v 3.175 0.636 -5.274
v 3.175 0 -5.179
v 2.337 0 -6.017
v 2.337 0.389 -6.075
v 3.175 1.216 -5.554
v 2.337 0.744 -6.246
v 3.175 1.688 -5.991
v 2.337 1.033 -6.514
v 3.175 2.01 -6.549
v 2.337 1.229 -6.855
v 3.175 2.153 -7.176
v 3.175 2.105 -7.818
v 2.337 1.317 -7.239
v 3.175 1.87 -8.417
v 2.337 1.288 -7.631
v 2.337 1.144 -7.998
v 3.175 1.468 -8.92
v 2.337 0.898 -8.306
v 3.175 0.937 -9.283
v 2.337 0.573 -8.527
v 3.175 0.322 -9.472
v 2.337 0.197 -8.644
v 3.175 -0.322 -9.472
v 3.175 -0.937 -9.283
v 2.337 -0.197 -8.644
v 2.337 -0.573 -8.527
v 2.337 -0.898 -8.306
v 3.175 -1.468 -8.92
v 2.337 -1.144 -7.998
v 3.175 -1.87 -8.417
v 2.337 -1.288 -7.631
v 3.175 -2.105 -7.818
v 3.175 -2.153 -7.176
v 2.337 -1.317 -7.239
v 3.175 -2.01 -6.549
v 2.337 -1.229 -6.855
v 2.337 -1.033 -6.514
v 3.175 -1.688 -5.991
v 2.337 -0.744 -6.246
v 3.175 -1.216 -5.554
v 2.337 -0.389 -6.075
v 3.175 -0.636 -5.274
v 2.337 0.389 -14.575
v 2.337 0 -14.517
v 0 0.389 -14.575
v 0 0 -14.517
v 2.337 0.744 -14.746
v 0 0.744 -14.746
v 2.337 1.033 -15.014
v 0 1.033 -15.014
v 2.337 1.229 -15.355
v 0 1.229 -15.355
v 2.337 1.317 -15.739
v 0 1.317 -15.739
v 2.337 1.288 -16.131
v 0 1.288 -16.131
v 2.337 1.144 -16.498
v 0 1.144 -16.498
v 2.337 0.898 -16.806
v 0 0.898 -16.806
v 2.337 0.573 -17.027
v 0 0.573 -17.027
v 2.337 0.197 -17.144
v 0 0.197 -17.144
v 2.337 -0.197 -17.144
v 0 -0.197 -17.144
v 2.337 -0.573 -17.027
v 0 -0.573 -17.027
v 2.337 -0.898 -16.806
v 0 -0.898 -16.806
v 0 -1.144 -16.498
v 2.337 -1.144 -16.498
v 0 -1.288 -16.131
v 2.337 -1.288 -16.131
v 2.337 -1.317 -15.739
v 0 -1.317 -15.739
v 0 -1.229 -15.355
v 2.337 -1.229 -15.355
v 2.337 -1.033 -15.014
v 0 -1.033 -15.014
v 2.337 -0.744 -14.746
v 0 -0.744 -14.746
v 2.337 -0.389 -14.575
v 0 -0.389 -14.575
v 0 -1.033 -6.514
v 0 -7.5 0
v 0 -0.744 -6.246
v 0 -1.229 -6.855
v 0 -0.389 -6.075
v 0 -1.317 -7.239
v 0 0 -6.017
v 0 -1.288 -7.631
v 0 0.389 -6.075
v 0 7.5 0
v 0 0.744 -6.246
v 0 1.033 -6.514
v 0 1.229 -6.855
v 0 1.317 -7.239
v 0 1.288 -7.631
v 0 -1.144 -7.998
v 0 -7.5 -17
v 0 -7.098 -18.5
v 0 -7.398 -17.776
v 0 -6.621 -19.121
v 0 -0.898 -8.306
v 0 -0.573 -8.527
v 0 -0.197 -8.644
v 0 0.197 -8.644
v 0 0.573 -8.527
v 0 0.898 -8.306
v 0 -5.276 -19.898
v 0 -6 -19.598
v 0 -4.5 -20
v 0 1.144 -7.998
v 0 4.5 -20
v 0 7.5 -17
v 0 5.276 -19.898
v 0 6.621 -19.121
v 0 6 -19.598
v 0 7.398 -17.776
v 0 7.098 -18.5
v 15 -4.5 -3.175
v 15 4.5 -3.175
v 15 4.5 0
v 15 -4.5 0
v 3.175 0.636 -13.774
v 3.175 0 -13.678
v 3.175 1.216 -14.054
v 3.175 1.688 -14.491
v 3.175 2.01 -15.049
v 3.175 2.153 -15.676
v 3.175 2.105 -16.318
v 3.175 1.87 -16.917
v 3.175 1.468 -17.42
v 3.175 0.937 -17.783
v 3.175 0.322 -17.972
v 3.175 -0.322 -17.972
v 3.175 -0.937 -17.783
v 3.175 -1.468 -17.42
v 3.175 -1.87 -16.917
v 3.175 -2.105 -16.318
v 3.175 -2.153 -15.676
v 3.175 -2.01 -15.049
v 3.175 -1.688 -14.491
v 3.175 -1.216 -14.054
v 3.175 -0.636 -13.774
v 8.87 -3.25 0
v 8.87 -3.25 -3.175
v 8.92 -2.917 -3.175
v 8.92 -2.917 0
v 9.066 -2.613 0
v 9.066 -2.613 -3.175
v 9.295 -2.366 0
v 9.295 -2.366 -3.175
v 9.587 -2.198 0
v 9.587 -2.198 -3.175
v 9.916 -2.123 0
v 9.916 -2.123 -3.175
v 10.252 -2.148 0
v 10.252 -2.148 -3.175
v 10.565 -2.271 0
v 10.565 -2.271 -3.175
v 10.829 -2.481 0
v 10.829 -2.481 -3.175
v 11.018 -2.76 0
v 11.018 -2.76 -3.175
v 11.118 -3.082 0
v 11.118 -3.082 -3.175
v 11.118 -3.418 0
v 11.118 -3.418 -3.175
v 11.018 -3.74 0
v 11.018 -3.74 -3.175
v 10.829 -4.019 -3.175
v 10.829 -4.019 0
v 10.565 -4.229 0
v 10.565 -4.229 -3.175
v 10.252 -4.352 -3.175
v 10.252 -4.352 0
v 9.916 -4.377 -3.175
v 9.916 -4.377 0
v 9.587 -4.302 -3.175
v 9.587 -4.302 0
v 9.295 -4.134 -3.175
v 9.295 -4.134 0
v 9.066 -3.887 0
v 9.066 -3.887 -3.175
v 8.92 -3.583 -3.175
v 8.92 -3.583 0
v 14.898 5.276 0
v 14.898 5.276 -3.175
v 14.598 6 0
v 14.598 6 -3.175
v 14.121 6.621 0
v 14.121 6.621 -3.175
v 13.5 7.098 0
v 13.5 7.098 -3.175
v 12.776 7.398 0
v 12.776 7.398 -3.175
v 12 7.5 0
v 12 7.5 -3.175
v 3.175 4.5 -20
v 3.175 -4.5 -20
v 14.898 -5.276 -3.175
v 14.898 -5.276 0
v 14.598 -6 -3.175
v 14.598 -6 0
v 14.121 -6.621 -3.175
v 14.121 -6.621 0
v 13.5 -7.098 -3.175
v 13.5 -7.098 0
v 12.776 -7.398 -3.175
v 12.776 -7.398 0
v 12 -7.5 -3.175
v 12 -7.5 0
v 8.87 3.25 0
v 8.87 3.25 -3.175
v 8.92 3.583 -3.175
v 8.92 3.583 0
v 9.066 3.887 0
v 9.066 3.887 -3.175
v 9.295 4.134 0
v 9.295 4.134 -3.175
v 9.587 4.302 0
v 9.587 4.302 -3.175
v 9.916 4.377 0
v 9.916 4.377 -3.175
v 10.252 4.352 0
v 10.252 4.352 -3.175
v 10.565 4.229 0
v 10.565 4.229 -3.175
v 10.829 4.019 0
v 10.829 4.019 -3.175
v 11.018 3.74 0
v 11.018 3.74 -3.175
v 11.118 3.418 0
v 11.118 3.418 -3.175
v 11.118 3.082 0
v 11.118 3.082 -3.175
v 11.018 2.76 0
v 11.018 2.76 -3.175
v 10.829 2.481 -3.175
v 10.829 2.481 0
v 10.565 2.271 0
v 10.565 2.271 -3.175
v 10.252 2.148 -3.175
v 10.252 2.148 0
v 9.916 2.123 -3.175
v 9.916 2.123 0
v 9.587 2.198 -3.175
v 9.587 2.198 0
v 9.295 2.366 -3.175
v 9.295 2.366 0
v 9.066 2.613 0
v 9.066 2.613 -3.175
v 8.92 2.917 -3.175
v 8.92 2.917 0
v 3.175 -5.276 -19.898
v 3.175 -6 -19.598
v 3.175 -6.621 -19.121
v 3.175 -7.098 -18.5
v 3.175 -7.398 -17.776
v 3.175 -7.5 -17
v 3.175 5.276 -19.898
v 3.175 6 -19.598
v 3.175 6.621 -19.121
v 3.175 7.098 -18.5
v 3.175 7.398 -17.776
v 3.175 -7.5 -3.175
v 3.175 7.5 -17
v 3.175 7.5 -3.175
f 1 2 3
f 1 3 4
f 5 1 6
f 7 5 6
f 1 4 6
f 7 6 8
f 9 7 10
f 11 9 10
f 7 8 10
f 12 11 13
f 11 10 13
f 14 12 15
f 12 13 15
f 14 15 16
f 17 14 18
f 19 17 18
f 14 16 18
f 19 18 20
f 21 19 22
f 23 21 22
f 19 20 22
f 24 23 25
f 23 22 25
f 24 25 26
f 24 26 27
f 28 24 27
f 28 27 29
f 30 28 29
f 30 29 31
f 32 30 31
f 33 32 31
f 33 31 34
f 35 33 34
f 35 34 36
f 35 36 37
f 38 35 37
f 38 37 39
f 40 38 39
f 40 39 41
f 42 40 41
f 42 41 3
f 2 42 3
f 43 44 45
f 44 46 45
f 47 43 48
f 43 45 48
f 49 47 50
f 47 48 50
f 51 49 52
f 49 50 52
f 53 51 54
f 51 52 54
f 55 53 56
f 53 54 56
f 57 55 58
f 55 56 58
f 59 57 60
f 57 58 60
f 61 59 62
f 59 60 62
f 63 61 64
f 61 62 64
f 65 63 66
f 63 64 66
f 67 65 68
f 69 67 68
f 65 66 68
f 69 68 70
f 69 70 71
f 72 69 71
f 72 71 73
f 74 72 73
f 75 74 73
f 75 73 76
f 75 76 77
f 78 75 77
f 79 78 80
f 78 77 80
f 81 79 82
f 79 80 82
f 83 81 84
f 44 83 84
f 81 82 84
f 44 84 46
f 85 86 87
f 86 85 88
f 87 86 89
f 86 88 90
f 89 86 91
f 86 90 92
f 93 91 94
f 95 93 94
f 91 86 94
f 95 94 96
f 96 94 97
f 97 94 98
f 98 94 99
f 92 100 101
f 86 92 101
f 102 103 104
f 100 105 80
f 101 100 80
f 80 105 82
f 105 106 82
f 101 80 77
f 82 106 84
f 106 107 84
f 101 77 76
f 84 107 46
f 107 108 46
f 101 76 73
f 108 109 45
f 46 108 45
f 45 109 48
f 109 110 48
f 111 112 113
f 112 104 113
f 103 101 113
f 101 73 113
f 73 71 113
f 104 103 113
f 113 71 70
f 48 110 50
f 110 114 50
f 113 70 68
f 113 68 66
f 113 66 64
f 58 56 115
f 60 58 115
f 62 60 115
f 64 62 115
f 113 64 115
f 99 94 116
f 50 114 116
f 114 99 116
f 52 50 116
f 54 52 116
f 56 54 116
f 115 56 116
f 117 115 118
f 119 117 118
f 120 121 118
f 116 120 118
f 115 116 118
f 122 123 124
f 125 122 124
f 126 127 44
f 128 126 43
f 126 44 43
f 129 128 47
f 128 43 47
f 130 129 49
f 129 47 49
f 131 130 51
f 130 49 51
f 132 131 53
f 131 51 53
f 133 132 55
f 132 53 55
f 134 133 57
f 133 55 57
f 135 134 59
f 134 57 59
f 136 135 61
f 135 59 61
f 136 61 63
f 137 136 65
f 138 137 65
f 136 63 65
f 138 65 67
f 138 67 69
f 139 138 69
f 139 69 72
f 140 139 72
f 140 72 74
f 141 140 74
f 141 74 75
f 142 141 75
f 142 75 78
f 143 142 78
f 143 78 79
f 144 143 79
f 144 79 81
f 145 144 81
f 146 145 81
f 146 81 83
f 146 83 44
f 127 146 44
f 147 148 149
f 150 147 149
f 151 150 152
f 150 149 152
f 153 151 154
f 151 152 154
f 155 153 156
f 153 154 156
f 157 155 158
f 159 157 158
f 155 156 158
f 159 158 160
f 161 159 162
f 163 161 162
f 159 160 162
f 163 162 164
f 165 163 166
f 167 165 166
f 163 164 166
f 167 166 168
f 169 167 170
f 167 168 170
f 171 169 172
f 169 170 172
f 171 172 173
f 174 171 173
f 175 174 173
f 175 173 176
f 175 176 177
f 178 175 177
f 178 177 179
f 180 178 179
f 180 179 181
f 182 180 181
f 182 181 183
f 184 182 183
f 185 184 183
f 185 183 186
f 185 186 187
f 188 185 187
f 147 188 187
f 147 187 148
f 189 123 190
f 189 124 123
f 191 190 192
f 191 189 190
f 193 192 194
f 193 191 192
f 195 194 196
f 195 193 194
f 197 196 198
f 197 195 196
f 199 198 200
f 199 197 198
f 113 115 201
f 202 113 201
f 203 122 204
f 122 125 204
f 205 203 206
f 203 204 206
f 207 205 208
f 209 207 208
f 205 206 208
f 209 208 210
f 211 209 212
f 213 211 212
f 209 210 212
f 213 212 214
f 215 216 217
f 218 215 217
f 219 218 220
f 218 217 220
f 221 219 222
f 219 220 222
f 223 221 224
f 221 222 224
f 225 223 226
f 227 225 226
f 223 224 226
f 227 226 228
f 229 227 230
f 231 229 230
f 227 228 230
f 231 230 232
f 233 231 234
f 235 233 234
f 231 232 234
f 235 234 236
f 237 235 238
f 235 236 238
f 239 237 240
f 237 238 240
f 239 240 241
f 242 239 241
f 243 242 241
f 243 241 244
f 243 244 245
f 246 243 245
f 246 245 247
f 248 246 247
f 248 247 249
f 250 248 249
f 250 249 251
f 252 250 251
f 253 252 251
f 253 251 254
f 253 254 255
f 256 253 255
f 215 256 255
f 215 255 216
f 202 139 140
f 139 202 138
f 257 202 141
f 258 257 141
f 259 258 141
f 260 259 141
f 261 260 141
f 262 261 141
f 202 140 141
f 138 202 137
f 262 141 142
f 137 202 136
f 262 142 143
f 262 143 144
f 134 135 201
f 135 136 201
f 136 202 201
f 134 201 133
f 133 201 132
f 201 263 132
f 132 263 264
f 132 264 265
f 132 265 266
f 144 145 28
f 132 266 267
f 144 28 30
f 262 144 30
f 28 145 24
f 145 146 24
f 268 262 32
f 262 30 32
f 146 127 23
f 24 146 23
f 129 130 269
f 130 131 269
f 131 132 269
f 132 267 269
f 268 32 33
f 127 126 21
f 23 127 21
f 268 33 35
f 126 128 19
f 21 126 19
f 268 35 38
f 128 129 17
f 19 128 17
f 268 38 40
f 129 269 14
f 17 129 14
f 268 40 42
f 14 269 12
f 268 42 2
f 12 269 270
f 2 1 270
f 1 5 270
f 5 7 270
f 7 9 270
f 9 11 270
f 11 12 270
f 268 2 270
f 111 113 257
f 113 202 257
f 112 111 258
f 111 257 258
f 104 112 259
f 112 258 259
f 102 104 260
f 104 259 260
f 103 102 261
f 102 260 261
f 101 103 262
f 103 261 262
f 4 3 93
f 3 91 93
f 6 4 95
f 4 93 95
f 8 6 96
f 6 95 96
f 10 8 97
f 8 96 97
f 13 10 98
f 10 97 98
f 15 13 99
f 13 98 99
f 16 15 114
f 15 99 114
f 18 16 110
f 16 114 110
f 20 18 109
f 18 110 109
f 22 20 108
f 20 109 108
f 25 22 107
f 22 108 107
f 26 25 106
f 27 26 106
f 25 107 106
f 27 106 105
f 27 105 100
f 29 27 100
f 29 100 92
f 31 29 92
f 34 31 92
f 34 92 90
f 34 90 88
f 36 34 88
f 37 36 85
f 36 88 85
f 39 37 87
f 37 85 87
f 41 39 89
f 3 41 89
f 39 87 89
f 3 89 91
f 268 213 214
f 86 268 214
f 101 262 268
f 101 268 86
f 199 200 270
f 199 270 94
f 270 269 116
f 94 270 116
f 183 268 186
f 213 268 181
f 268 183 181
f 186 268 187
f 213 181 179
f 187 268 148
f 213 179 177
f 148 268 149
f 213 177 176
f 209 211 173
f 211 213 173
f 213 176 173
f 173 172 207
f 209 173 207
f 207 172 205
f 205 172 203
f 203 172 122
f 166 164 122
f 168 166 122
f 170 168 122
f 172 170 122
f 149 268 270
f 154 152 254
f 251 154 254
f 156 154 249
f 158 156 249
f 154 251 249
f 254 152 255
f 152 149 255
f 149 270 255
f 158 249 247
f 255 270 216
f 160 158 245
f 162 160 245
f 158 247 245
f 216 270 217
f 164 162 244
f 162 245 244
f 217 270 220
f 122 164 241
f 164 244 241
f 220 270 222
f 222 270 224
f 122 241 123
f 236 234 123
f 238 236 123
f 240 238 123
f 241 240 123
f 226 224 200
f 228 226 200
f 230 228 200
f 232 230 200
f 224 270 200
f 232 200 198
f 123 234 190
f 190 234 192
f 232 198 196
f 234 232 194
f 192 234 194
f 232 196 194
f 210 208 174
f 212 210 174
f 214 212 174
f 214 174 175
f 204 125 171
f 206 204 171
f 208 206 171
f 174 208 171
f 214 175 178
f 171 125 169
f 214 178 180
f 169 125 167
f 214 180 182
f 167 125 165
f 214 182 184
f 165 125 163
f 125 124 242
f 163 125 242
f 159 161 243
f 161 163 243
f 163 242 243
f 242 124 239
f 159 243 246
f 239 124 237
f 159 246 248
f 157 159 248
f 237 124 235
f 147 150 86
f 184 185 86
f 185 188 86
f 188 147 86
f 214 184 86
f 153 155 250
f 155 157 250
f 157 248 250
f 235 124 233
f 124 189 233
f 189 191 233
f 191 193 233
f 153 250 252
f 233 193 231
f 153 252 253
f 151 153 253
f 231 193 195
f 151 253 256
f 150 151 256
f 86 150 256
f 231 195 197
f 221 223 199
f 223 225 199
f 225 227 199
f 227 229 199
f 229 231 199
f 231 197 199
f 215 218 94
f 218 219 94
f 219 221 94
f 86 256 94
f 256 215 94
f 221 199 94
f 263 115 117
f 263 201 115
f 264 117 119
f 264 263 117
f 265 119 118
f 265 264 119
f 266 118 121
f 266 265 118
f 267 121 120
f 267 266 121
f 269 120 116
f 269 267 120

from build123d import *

# Parameters (mm, degrees)
BOSS_EXTRUDE1_DEPTH             = 7.5
F_2_CLEARANCE_HOLE1_D           = 2.2606
F_3_CLEARANCE_HOLE1_D           = 2.6416
F_3_CLEARANCE_HOLE1_CSINK_D     = 4.318
F_3_CLEARANCE_HOLE1_CSINK_ANGLE = 90
FILLET1_R                       = 3


with BuildPart() as part:
    # Sketch3 → Boss-Extrude1 (new body, symmetric)
    with BuildSketch(Plane(origin=(0, 0, 0), x_dir=(1, 0, 0), z_dir=(0, 1, 0))):
        Polygon((0, 0), (0, 20), (3.175, 20), (3.175, 3.175), (15, 3.175), (15, 0), align=None)
    extrude(amount=BOSS_EXTRUDE1_DEPTH, both=True)

    # #2 Clearance Hole1 (through all)
    with Locations(Plane.XY):
        with Locations((10, -3.25), (10, 3.25)):
            Hole(F_2_CLEARANCE_HOLE1_D / 2)

    # #3 Clearance Hole1 (through all)
    with Locations(Plane(origin=(3.175, 0, 0), x_dir=(0, 0, -1), z_dir=(1, 0, 0))):
        with Locations((7.3375, 0), (15.8375, 0)):
            CounterSinkHole(F_3_CLEARANCE_HOLE1_D / 2, F_3_CLEARANCE_HOLE1_CSINK_D / 2, counter_sink_angle=F_3_CLEARANCE_HOLE1_CSINK_ANGLE)

    # Fillet1
    fillet1_edges = [part.edges().sort_by_distance(p)[0] for p in [
        (1.5875, 7.5, -20),
        (1.5875, -7.5, -20),
        (15, -7.5, -1.5875),
        (15, 7.5, -1.5875),
    ]]
    fillet(fillet1_edges, radius=FILLET1_R)


solid = part.part
